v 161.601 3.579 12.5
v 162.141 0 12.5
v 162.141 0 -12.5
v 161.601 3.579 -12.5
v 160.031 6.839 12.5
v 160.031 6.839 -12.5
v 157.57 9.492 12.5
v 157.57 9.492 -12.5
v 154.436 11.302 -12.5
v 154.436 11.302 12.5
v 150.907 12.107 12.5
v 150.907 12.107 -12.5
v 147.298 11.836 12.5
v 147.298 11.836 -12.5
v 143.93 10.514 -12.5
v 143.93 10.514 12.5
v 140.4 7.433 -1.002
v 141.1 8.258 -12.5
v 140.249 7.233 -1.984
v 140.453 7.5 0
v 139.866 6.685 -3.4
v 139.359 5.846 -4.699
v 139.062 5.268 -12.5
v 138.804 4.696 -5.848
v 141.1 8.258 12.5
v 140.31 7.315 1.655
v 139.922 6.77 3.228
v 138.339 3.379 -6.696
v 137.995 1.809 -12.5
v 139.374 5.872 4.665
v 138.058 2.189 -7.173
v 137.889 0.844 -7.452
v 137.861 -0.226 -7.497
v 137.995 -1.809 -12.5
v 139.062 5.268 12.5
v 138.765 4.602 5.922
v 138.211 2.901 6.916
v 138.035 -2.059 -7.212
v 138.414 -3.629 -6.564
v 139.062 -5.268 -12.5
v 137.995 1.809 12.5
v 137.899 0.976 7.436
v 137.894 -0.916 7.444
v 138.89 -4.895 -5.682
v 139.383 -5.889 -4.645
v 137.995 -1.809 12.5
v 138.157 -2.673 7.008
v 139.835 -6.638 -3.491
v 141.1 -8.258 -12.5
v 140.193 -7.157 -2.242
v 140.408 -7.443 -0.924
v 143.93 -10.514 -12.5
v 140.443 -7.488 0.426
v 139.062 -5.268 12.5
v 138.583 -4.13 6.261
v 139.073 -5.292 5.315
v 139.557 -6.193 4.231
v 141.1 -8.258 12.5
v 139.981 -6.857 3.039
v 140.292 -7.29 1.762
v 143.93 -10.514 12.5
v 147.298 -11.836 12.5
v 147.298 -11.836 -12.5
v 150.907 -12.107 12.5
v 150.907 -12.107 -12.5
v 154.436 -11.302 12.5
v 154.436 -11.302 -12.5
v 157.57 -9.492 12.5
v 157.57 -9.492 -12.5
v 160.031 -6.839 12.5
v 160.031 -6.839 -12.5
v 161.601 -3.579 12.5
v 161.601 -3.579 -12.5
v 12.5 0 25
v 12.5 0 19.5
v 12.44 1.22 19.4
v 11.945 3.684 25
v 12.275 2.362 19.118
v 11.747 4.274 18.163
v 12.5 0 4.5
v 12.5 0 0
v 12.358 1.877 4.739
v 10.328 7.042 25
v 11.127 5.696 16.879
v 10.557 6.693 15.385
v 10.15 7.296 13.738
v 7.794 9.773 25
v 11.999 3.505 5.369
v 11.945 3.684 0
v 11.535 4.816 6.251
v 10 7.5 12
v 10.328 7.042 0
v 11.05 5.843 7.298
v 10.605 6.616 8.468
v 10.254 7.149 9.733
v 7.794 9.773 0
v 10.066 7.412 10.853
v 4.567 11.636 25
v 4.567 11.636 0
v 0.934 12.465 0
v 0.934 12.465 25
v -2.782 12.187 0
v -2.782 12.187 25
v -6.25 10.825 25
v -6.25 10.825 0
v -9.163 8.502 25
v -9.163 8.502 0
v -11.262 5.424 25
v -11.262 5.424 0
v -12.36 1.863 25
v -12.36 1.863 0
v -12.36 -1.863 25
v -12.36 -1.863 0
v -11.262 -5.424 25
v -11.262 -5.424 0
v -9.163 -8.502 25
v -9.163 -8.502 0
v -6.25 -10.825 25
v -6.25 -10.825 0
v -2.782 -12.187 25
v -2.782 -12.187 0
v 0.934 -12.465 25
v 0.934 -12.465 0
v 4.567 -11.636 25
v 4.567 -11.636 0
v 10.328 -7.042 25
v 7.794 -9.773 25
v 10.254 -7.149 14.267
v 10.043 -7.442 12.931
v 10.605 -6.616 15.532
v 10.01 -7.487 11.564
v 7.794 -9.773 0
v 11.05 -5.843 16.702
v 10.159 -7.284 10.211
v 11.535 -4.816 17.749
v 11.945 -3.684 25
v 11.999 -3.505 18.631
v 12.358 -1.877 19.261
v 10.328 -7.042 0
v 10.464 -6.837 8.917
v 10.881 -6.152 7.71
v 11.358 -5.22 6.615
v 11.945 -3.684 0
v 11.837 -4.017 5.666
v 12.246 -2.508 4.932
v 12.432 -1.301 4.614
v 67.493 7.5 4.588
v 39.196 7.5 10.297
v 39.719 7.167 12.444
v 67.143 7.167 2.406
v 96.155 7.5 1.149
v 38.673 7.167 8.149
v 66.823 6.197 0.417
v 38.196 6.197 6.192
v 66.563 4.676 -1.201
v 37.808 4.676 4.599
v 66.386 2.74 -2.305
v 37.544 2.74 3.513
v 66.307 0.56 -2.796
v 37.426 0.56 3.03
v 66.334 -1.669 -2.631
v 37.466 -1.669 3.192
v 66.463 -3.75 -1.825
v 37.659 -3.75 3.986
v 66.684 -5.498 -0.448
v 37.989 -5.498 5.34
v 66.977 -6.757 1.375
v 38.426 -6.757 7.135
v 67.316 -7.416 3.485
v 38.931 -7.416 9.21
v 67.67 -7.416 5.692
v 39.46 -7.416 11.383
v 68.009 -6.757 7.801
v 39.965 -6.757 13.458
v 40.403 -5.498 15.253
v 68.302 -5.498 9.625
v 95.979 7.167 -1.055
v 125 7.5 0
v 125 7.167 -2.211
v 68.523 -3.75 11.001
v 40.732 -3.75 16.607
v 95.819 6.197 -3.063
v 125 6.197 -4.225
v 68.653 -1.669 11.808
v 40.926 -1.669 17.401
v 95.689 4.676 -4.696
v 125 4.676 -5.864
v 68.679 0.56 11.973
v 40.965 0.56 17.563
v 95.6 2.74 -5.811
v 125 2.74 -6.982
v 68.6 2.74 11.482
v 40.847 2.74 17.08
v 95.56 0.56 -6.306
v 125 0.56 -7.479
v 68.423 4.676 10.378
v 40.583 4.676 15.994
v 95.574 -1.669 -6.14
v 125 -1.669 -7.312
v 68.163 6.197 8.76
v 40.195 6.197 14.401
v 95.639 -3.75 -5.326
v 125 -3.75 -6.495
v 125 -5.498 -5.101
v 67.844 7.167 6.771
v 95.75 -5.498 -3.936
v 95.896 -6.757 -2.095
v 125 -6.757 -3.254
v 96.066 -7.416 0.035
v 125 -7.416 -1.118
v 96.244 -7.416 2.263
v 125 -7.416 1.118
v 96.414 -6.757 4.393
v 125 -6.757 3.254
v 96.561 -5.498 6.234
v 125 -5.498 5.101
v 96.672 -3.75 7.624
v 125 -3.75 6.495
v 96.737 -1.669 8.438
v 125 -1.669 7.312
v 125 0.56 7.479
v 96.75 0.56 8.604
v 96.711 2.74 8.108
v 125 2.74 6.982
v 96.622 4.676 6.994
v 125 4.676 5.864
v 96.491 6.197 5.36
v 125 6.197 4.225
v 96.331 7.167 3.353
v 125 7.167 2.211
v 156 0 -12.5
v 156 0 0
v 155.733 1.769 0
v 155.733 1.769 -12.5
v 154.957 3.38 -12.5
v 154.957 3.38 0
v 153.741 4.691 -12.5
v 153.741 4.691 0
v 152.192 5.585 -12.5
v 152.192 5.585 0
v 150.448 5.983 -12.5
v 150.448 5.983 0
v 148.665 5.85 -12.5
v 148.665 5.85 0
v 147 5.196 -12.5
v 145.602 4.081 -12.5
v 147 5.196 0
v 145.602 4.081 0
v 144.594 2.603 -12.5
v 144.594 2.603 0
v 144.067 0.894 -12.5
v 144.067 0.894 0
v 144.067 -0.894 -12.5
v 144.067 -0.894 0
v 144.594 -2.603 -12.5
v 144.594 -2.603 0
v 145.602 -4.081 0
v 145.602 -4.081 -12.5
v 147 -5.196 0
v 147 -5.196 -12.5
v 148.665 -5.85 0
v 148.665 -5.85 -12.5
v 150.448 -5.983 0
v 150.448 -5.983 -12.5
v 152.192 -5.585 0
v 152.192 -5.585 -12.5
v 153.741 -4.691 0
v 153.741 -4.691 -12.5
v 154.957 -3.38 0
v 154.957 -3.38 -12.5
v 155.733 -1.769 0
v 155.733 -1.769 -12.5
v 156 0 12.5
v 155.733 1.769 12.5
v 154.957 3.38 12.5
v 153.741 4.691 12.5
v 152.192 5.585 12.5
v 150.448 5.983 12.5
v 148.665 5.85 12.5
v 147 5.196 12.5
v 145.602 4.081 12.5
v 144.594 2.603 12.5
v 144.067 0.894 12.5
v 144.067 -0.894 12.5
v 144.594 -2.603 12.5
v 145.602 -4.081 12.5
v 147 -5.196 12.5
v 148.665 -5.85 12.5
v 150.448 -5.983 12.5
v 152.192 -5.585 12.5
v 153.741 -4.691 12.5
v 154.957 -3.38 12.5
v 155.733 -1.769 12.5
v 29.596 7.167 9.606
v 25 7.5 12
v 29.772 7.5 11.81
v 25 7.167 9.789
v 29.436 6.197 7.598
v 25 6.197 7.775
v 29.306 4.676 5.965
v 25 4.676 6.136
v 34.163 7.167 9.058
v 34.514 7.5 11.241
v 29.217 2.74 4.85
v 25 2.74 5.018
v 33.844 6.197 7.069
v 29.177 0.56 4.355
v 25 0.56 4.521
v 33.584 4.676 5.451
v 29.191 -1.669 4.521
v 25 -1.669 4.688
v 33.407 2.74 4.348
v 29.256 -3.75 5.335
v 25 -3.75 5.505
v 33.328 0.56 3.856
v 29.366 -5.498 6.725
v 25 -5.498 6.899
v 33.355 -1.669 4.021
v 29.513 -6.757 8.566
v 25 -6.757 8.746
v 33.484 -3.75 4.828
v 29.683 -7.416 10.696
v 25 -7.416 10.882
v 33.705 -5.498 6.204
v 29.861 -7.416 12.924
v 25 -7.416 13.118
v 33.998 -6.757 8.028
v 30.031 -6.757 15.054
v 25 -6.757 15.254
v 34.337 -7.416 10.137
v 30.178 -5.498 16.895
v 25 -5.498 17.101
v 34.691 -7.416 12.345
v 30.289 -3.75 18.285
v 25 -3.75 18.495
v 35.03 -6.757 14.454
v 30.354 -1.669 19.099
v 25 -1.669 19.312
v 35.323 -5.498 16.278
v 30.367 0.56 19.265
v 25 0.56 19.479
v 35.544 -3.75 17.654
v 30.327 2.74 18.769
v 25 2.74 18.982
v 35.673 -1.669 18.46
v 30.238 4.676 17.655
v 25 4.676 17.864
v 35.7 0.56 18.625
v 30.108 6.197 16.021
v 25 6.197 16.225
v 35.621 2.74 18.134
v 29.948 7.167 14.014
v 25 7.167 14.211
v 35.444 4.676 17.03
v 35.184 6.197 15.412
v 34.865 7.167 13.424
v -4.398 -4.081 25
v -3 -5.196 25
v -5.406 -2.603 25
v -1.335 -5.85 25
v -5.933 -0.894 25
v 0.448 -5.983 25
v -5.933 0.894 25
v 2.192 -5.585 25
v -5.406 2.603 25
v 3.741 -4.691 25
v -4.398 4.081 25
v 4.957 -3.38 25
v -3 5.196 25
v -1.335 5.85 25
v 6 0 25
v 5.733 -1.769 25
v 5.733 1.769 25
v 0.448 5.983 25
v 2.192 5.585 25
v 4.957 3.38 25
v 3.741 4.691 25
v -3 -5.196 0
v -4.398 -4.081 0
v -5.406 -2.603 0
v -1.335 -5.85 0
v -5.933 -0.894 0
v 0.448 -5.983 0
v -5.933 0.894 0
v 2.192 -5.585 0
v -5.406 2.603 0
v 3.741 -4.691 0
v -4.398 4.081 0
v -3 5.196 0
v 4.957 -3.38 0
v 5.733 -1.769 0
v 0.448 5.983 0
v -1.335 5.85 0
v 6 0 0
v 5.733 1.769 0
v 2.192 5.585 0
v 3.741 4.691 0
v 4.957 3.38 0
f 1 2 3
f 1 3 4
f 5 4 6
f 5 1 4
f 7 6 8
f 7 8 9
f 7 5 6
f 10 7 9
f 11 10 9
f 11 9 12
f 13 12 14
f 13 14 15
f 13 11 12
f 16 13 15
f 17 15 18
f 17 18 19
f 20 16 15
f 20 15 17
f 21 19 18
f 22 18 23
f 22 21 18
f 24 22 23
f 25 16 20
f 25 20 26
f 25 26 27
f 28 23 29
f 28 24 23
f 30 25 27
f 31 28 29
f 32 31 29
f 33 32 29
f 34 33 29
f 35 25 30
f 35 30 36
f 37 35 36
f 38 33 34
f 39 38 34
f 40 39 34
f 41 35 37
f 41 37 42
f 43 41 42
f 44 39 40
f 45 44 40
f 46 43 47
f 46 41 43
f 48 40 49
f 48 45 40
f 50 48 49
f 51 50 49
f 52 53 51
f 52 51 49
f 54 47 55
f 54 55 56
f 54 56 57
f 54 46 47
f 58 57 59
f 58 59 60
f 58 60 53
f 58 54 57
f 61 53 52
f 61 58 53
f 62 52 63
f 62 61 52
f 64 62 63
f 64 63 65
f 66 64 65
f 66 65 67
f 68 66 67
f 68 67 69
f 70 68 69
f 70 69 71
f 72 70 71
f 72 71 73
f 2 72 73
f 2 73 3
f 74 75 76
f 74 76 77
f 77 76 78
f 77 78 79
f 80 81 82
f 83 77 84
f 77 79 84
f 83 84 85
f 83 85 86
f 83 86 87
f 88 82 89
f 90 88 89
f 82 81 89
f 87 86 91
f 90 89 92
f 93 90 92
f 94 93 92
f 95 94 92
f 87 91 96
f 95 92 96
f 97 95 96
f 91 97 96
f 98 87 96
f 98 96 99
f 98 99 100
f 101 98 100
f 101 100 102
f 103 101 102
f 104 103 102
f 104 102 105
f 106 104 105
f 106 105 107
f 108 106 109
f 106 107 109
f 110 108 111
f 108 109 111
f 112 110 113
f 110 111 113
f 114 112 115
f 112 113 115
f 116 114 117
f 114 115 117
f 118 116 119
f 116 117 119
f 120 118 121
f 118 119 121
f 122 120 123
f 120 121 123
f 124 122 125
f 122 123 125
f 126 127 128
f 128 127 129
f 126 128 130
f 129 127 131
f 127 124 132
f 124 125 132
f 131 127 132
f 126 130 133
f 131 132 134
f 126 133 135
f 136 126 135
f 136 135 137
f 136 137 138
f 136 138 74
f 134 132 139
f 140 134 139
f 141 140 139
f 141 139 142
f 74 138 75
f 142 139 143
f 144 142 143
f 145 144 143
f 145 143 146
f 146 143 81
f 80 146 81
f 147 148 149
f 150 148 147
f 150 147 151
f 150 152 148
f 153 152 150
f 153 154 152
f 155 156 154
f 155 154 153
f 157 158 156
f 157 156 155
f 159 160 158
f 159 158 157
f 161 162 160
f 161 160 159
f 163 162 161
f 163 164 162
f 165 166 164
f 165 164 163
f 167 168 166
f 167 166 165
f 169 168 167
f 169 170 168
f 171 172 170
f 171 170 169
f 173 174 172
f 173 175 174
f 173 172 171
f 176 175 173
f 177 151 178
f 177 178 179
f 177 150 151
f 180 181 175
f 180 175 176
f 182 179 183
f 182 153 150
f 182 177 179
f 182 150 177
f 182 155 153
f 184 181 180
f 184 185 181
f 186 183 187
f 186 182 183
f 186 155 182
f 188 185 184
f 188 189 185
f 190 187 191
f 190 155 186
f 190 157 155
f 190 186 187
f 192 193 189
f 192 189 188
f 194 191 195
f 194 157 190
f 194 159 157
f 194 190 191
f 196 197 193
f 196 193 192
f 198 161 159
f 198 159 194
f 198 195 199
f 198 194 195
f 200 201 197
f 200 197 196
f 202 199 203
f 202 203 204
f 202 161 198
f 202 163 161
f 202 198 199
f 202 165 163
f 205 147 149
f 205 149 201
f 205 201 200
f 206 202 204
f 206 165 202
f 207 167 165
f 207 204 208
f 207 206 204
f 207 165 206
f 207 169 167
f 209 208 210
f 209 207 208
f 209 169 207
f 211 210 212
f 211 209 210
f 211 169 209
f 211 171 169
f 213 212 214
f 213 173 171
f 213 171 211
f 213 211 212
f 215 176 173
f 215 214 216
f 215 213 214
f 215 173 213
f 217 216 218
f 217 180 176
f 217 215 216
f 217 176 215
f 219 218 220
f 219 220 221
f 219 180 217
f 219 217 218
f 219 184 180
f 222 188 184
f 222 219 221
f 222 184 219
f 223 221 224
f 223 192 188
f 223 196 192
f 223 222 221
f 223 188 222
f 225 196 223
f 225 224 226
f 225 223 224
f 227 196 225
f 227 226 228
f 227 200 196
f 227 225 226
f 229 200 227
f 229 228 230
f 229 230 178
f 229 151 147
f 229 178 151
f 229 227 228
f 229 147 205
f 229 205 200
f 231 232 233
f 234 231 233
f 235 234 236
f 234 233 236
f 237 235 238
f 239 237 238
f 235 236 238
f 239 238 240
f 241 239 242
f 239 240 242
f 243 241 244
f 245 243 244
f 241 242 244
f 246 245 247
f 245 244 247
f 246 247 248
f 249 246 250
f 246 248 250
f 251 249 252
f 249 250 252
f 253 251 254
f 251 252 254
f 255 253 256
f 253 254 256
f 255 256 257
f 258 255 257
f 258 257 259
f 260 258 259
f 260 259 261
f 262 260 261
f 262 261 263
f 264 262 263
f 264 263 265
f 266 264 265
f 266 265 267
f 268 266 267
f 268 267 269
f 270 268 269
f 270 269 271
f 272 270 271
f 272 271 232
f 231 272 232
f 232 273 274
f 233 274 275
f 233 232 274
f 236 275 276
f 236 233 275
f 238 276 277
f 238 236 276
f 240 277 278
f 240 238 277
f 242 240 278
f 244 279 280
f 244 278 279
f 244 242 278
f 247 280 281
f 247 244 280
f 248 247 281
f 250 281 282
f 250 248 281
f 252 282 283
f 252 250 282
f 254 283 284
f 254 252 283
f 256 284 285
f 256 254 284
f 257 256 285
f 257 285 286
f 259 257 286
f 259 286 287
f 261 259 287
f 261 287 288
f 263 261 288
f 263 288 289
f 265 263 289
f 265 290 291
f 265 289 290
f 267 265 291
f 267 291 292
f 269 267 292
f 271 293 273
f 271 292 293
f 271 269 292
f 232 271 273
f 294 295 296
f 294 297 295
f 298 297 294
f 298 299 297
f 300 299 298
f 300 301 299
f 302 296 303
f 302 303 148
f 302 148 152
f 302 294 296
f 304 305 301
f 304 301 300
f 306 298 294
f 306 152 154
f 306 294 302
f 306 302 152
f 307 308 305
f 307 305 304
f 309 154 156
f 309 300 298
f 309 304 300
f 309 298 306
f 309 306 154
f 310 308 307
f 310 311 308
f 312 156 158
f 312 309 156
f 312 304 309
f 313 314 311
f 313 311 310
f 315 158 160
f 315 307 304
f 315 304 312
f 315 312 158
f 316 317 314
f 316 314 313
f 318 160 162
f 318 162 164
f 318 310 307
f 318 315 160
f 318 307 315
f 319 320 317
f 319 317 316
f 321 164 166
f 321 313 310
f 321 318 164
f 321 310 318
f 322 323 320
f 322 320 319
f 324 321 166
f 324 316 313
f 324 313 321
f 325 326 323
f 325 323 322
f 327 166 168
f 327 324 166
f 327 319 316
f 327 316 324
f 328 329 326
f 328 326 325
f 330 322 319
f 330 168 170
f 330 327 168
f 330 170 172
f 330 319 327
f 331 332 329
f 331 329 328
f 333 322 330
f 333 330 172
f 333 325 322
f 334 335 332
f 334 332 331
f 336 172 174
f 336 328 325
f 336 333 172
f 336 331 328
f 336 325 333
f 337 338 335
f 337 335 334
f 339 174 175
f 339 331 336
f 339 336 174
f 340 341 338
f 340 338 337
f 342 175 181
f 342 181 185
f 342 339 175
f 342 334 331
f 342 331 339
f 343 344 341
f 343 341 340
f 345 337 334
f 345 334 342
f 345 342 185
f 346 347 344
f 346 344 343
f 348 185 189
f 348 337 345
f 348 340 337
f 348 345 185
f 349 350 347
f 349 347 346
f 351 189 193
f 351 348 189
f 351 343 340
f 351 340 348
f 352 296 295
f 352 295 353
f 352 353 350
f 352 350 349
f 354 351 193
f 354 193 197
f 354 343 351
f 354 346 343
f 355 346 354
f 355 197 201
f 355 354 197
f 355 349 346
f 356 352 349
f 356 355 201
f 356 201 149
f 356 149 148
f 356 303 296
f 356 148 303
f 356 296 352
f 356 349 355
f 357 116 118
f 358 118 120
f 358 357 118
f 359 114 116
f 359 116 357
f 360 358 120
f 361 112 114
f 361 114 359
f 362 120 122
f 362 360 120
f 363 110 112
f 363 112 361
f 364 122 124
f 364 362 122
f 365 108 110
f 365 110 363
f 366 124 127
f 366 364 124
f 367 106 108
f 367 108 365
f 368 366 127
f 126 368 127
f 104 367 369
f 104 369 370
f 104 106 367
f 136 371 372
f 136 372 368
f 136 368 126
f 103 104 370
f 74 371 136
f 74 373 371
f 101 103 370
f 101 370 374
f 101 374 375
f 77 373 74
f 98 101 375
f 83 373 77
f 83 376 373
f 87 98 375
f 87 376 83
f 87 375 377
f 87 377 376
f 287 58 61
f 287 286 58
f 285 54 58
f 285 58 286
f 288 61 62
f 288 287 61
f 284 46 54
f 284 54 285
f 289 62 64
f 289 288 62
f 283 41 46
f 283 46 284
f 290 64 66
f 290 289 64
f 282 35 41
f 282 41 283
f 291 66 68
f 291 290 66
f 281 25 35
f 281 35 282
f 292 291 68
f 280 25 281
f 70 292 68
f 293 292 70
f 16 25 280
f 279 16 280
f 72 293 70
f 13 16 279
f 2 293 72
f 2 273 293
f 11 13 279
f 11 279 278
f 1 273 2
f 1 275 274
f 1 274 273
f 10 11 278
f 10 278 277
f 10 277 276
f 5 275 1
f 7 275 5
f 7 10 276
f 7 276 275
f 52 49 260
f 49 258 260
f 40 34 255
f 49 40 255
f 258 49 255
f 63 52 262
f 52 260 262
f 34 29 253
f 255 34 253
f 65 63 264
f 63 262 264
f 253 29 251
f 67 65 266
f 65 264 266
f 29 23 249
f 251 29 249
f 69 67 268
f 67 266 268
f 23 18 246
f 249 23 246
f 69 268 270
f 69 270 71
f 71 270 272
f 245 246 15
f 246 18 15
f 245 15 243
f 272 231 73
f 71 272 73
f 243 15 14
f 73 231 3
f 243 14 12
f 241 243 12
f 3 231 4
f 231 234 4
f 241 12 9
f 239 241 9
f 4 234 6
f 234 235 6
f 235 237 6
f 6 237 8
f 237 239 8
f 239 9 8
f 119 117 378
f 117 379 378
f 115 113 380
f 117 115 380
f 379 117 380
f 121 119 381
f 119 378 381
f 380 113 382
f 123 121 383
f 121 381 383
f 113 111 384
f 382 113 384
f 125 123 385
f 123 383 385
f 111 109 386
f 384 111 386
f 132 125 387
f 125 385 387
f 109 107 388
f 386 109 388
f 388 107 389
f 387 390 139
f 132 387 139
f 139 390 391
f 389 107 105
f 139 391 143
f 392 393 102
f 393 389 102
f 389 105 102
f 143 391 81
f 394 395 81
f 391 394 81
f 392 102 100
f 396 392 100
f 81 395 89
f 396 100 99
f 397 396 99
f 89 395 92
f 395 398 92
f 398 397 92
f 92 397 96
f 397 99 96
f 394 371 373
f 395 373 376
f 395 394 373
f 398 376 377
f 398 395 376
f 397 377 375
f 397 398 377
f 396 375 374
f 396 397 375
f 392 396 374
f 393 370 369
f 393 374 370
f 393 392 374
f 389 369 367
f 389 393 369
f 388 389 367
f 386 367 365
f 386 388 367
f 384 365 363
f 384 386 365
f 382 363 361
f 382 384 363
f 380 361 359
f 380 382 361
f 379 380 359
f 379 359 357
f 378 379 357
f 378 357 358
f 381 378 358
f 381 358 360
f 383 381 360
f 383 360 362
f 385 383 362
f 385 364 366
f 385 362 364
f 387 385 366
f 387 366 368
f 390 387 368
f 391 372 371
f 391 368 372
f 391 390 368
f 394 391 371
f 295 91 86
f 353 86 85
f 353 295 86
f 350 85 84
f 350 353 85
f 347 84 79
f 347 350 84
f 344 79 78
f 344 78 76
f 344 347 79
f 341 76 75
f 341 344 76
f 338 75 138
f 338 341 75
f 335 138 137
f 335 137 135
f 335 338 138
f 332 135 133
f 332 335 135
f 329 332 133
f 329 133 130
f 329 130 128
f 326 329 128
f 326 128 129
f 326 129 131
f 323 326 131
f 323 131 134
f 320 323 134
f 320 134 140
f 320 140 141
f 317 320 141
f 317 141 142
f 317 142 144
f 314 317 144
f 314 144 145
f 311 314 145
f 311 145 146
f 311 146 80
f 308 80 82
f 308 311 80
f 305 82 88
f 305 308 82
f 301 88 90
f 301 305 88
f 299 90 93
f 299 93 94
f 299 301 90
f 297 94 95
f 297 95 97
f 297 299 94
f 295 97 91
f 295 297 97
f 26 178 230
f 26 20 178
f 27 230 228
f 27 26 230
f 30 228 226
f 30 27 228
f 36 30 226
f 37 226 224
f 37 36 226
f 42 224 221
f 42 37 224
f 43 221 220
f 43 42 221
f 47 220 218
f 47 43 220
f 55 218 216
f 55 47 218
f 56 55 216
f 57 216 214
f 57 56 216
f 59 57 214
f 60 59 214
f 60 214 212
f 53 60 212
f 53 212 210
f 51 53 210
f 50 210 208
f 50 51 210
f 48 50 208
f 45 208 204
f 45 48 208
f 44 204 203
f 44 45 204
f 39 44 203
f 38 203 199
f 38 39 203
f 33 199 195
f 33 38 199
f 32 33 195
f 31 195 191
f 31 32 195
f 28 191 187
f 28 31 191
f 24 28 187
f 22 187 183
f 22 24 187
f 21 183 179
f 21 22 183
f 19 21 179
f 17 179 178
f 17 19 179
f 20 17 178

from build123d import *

# Parameters (mm, degrees)
F0_R          = 12.5
F1_DEPTH      = 25
F0_R_2        = 12.1407528782
F2_DEPTH      = 12.5
F4_R          = 7.5
F6_R          = 6
F7_DEPTH      = 12.5010001
F7_DEPTH_BACK = 25.0010001


with BuildPart() as f1:
    # F0 (on Top) → F1 (new body)
    with BuildSketch(Plane.XY):
        Circle(F0_R)
    extrude(amount=F1_DEPTH)



with BuildPart() as f2:
    # F0 (on Top) → F2 (new body, symmetric)
    with BuildSketch(Plane.XY):
        with Locations((150, 0)):
            Circle(F0_R_2)
    extrude(amount=F2_DEPTH, both=True)


with BuildPart() as f1_1:
    add(f1.part)

    add(f2.part)  # F5 merges F2
    # F5: sweep along a path in F3
    with BuildLine(Plane.XZ) as f5_path:
        Line((0, 12), (25, 12))
        ThreePointArc((25, 12), (32.1487132371, 11.5726103092), (39.1955835962, 10.2965299685))
        ThreePointArc((39.1955835962, 10.2965299685), (81.789999989, 2.5833332421), (125, 0))
        Line((125, 0), (150, 0))
    # F4 (on Right) → F5 (sweep)
    with BuildSketch(Plane.YZ):
        with Locations((0, 12)):
            Circle(F4_R)
    sweep(path=f5_path.line)

    # F6 (on Top) → F7 (cut, two sides)
    with BuildSketch(Plane.XY) as f7_sk:
        Circle(F6_R)
        with Locations((150, 0)):
            Circle(F6_R)
    extrude(amount=-F7_DEPTH, mode=Mode.SUBTRACT)
    extrude(f7_sk.sketch, amount=F7_DEPTH_BACK, mode=Mode.SUBTRACT)


solid = f1_1.part
